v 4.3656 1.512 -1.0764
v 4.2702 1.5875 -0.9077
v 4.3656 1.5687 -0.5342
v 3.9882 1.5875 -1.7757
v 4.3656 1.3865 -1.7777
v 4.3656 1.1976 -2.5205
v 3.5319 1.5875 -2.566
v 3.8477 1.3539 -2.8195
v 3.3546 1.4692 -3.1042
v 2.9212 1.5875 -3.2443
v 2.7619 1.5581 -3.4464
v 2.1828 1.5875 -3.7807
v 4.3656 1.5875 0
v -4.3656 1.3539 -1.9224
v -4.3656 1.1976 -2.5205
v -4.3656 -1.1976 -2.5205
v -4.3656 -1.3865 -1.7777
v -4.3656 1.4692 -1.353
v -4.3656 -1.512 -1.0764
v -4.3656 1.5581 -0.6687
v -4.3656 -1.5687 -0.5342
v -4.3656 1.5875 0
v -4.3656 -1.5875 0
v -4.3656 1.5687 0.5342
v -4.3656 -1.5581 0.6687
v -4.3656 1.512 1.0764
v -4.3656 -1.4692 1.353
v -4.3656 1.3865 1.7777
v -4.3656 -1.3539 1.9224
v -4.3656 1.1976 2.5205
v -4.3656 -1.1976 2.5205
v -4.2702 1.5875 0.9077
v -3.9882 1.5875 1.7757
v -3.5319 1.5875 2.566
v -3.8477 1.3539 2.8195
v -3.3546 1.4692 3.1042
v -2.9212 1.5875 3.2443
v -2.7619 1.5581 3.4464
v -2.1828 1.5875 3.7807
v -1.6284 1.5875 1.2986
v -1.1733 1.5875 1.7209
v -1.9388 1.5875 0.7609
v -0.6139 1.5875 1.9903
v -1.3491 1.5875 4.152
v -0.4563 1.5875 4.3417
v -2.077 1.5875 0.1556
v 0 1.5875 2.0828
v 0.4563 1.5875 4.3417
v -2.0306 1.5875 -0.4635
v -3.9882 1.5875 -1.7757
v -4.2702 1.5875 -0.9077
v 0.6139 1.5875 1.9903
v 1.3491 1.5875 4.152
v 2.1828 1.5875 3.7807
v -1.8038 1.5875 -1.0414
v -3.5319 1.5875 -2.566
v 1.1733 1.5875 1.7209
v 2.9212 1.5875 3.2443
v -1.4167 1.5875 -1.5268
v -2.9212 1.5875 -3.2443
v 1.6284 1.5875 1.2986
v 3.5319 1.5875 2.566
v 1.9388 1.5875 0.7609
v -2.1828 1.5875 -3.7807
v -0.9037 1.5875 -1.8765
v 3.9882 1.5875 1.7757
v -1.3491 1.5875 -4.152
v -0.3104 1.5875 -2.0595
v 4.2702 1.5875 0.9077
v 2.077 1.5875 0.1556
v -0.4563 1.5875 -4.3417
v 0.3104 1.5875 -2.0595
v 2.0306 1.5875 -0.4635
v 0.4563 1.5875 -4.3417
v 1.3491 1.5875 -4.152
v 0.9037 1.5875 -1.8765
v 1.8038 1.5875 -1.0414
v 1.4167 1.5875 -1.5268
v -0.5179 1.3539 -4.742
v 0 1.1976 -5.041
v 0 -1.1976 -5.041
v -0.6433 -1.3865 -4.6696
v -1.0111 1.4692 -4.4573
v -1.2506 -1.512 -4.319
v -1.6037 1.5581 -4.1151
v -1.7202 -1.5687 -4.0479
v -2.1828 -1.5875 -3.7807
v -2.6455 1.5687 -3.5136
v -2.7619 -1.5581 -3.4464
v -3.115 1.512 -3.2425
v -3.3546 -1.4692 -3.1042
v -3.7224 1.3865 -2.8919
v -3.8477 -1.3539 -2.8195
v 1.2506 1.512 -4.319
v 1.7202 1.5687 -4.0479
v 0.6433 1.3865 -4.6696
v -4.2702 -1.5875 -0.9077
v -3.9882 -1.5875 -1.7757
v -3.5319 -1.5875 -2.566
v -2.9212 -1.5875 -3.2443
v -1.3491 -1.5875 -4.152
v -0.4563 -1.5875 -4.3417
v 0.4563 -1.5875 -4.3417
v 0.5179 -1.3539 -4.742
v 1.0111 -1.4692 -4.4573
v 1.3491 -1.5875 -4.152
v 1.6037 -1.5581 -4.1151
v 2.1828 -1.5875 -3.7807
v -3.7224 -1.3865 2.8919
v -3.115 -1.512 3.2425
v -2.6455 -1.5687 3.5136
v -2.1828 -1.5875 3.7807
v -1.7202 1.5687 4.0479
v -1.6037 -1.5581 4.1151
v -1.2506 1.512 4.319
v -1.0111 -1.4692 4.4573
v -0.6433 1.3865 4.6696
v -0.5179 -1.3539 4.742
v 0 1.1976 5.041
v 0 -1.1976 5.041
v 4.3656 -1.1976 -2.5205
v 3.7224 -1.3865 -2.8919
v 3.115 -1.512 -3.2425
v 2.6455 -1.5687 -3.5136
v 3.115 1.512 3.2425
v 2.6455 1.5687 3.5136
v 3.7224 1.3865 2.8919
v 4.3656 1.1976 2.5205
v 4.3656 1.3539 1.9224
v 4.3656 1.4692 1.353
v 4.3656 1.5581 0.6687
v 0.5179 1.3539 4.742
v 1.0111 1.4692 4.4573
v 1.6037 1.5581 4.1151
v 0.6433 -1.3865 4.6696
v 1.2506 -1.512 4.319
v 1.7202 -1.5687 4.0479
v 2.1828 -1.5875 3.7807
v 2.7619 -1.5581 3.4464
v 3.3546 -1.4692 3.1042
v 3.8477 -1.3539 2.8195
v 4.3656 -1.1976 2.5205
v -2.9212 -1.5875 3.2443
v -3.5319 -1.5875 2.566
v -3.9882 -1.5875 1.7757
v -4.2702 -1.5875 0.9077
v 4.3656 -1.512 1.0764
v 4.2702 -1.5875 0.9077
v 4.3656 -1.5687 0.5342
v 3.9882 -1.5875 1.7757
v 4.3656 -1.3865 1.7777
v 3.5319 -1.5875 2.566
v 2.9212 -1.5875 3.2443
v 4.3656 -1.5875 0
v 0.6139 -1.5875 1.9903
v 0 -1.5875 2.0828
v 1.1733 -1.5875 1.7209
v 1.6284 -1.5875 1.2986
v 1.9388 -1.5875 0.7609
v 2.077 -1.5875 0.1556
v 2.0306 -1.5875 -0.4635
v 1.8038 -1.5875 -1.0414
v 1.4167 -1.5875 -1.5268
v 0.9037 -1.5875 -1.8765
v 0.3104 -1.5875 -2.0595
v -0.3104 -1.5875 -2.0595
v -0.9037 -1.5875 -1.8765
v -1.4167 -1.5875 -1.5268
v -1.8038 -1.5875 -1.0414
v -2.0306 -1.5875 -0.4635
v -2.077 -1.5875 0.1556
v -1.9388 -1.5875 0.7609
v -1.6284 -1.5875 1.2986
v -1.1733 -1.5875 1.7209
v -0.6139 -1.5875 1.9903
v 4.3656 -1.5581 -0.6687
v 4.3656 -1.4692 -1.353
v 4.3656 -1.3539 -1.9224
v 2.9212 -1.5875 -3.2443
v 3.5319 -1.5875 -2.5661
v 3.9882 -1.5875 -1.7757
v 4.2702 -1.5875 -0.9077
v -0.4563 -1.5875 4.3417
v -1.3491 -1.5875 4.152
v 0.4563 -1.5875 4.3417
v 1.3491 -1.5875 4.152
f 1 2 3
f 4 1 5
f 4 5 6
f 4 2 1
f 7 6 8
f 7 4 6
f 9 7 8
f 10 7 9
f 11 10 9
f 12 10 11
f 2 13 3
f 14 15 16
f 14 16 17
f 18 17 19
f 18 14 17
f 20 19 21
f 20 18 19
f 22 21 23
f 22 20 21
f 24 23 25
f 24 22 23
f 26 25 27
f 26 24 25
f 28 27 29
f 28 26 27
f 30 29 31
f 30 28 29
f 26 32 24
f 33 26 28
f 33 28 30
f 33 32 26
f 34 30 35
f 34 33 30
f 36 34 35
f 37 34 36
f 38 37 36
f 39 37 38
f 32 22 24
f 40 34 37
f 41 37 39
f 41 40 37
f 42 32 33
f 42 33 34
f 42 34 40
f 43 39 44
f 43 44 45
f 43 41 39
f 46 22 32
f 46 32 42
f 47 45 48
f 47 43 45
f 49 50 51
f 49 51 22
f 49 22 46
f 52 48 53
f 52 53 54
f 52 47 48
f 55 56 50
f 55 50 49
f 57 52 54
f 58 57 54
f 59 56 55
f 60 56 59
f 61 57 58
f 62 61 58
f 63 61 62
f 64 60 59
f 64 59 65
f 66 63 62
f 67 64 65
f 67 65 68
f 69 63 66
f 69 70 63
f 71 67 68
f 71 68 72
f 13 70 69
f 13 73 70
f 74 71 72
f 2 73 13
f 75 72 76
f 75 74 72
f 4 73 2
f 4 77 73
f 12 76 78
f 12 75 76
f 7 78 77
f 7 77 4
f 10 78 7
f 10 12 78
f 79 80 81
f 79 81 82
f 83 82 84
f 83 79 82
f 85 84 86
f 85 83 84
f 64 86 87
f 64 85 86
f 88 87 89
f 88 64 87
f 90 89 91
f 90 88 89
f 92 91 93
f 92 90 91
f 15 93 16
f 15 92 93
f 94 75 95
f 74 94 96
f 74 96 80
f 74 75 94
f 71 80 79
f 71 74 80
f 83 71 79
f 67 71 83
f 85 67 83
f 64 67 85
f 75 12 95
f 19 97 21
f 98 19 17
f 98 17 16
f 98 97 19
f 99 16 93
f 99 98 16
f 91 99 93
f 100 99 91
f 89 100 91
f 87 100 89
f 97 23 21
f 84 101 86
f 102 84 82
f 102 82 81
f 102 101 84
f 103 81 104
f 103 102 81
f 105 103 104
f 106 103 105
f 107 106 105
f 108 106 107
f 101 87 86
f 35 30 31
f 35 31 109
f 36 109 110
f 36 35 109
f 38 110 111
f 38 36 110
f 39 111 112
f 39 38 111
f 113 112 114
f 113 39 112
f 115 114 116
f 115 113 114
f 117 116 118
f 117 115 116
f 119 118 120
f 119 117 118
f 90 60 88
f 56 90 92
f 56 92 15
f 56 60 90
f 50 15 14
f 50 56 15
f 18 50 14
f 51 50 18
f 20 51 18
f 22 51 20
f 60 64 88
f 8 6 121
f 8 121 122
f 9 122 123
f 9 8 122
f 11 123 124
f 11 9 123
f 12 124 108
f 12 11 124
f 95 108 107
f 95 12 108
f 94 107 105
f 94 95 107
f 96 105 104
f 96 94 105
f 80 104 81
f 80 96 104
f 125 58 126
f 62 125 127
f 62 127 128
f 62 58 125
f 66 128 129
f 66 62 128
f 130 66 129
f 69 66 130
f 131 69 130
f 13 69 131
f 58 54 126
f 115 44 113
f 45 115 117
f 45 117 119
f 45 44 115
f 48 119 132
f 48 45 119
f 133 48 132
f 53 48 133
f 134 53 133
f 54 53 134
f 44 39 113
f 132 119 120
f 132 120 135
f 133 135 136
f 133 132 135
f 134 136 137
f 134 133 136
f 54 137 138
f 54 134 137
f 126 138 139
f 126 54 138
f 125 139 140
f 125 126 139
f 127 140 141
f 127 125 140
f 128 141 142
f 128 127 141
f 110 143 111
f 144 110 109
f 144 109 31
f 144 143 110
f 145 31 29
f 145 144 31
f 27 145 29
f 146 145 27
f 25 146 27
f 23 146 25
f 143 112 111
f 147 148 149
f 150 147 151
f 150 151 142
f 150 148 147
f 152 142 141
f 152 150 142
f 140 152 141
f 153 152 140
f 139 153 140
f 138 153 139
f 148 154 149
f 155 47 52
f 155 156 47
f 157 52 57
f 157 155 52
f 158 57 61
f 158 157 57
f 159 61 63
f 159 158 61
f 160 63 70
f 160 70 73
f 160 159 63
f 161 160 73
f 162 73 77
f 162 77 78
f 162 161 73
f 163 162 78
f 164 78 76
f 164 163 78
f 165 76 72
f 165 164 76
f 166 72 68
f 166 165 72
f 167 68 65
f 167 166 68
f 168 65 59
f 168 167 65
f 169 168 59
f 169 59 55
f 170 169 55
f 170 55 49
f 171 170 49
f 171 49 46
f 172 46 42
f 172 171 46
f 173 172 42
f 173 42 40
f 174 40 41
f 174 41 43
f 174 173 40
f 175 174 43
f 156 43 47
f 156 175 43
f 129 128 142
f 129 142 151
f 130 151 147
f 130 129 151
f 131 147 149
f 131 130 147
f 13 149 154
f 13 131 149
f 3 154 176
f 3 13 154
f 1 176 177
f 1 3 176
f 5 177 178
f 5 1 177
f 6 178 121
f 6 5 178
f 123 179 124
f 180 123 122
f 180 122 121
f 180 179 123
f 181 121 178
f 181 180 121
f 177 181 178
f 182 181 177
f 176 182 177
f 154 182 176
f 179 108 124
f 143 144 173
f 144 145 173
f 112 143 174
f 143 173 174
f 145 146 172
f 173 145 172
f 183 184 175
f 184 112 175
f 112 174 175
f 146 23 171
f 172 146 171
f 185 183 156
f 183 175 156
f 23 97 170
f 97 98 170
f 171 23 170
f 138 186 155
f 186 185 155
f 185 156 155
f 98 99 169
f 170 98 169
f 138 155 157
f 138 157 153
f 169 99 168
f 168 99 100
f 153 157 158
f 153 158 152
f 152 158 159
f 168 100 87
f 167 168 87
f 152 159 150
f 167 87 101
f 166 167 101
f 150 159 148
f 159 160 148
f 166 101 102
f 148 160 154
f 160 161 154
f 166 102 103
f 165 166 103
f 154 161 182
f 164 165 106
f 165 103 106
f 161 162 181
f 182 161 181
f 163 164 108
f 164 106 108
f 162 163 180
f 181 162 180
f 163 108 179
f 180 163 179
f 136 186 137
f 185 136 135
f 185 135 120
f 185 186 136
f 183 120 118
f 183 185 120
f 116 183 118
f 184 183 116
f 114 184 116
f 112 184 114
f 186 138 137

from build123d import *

# Parameters (mm, degrees)
SKETCH1_R               = 2.0828
BOSS_EXTRUDE1_DEPTH     = 1.5875
SKETCH5_OUTSIDE_W       = 42.524
SKETCH5_OUTSIDE_H       = 43.874
SKETCH5_OUTSIDE_R       = 4.365625
CUT_EXTRUDE2_DEPTH      = 8.385856901
CUT_EXTRUDE2_DRAFT      = -60
MIRROR1_COPY_1_SKETCH_W = 42.524
MIRROR1_COPY_1_SKETCH_H = 43.874
MIRROR1_COPY_1_SKETCH_R = 4.365625
MIRROR1_COPY_1_DEPTH    = 8.385856901
MIRROR1_COPY_1_DRAFT    = -60


with BuildPart() as part:
    # Sketch1 → Boss-Extrude1 (new, symmetric)
    with BuildSketch(Plane(origin=(0, 0, 0), x_dir=(1, 0, 0), z_dir=(0, 1, 0))):
        Polygon((-4.365625, 2.520494769), (-4.365625, -2.520494769), (0, -5.040989538), (4.365625, -2.520494769), (4.365625, 2.520494769), (0, 5.040989538), align=None)
        Circle(SKETCH1_R, mode=Mode.SUBTRACT)
    extrude(amount=BOSS_EXTRUDE1_DEPTH, both=True)


with BuildPart() as cut_extrude2_tool:
    # Sketch5 outside → Cut-Extrude2 (with draft: the straight prism first)
    with BuildSketch(Plane(origin=(0, 1.5875, 0), x_dir=(1, 0, 0), z_dir=(0, 1, 0))):
        Rectangle(SKETCH5_OUTSIDE_W, SKETCH5_OUTSIDE_H)
        Circle(SKETCH5_OUTSIDE_R, mode=Mode.SUBTRACT)
    extrude(amount=-CUT_EXTRUDE2_DEPTH)
    # Cut-Extrude2: the draft: its side faces are tilted about the plane it starts from
    cut_extrude2_sides = [cut_extrude2_tool.faces().sort_by_distance(p)[0] for p in [
        (0, -2.60542845, 21.937),
        (21.262, -2.60542845, 0),
        (0, -2.60542845, -21.937),
        (-21.262, -2.60542845, 0),
        (-4.365625, -2.60542845, 0),
    ]]
    draft(cut_extrude2_sides, Plane(origin=(0, 1.5875, 0), x_dir=(1, 0, 0), z_dir=(0, 1, 0)), CUT_EXTRUDE2_DRAFT)


with BuildPart() as part_1:
    add(part.part)

    # Cut-Extrude2: cut by cut_extrude2_tool
    add(cut_extrude2_tool.part, mode=Mode.SUBTRACT)


with BuildPart() as mirror1_copy_1_tool:
    # Mirror1 copy 1 sketch → Mirror1 copy 1 (with draft: the straight prism first)
    with BuildSketch(Plane.XZ.offset(1.5875)):
        Rectangle(MIRROR1_COPY_1_SKETCH_W, MIRROR1_COPY_1_SKETCH_H)
        Circle(MIRROR1_COPY_1_SKETCH_R, mode=Mode.SUBTRACT)
    extrude(amount=-MIRROR1_COPY_1_DEPTH)
    # Mirror1 copy 1: the draft: its side faces are tilted about the plane it starts from
    mirror1_copy_1_sides = [mirror1_copy_1_tool.faces().sort_by_distance(p)[0] for p in [
        (0, 2.60542845, 21.937),
        (21.262, 2.60542845, 0),
        (0, 2.60542845, -21.937),
        (-21.262, 2.60542845, 0),
        (-4.365625, 2.60542845, 0),
    ]]
    draft(mirror1_copy_1_sides, Plane.XZ.offset(1.5875), MIRROR1_COPY_1_DRAFT)


with BuildPart() as part_2:
    add(part_1.part)

    # Mirror1 copy 1: cut by mirror1_copy_1_tool
    add(mirror1_copy_1_tool.part, mode=Mode.SUBTRACT)


solid = part_2.part
